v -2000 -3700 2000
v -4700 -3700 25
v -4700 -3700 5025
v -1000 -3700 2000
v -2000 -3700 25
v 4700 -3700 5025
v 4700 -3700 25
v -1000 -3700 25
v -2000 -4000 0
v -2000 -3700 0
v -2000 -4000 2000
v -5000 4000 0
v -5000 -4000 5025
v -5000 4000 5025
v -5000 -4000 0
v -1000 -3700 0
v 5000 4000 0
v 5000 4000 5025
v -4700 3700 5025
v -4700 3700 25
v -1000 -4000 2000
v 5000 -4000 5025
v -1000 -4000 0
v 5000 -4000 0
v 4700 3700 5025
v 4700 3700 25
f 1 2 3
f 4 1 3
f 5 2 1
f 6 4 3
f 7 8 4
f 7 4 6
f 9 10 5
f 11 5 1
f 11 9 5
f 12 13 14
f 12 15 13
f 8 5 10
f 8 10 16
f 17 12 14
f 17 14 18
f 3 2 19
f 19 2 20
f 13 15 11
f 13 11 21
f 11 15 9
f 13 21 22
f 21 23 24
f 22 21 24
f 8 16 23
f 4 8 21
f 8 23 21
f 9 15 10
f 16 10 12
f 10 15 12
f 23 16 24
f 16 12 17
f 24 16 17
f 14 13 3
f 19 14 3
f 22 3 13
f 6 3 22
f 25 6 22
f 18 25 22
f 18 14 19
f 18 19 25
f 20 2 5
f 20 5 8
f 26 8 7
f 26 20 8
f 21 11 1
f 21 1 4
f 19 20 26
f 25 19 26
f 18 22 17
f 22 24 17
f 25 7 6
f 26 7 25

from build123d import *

# Parameters (mm, degrees)
F0_W     = 10000
F0_H     = 8000
F1_DEPTH = 25
F2_W     = 10000
F2_H     = 8000
F2_W_2   = 9400
F2_H_2   = 7400
F3_DEPTH = 5000
F4_W     = 1000
F4_H     = 2000
F5_DEPTH = 300


with BuildPart() as f1:
    # F0 (on Top) → F1 (new body)
    with BuildSketch(Plane.XY):
        Rectangle(F0_W, F0_H)
    extrude(amount=F1_DEPTH)

    # F2 (on face) → F3 (join)
    with BuildSketch(Plane.XY.offset(25)):
        Rectangle(F2_W, F2_H)
        Rectangle(F2_W_2, F2_H_2, mode=Mode.SUBTRACT)
    extrude(amount=F3_DEPTH)

    # F4 (on face) → F5 (cut, through all)
    with BuildSketch(Plane.XZ.offset(4000)):
        with Locations((-1500, 1000)):
            Rectangle(F4_W, F4_H)
    extrude(amount=-F5_DEPTH, mode=Mode.SUBTRACT)


solid = f1.part
